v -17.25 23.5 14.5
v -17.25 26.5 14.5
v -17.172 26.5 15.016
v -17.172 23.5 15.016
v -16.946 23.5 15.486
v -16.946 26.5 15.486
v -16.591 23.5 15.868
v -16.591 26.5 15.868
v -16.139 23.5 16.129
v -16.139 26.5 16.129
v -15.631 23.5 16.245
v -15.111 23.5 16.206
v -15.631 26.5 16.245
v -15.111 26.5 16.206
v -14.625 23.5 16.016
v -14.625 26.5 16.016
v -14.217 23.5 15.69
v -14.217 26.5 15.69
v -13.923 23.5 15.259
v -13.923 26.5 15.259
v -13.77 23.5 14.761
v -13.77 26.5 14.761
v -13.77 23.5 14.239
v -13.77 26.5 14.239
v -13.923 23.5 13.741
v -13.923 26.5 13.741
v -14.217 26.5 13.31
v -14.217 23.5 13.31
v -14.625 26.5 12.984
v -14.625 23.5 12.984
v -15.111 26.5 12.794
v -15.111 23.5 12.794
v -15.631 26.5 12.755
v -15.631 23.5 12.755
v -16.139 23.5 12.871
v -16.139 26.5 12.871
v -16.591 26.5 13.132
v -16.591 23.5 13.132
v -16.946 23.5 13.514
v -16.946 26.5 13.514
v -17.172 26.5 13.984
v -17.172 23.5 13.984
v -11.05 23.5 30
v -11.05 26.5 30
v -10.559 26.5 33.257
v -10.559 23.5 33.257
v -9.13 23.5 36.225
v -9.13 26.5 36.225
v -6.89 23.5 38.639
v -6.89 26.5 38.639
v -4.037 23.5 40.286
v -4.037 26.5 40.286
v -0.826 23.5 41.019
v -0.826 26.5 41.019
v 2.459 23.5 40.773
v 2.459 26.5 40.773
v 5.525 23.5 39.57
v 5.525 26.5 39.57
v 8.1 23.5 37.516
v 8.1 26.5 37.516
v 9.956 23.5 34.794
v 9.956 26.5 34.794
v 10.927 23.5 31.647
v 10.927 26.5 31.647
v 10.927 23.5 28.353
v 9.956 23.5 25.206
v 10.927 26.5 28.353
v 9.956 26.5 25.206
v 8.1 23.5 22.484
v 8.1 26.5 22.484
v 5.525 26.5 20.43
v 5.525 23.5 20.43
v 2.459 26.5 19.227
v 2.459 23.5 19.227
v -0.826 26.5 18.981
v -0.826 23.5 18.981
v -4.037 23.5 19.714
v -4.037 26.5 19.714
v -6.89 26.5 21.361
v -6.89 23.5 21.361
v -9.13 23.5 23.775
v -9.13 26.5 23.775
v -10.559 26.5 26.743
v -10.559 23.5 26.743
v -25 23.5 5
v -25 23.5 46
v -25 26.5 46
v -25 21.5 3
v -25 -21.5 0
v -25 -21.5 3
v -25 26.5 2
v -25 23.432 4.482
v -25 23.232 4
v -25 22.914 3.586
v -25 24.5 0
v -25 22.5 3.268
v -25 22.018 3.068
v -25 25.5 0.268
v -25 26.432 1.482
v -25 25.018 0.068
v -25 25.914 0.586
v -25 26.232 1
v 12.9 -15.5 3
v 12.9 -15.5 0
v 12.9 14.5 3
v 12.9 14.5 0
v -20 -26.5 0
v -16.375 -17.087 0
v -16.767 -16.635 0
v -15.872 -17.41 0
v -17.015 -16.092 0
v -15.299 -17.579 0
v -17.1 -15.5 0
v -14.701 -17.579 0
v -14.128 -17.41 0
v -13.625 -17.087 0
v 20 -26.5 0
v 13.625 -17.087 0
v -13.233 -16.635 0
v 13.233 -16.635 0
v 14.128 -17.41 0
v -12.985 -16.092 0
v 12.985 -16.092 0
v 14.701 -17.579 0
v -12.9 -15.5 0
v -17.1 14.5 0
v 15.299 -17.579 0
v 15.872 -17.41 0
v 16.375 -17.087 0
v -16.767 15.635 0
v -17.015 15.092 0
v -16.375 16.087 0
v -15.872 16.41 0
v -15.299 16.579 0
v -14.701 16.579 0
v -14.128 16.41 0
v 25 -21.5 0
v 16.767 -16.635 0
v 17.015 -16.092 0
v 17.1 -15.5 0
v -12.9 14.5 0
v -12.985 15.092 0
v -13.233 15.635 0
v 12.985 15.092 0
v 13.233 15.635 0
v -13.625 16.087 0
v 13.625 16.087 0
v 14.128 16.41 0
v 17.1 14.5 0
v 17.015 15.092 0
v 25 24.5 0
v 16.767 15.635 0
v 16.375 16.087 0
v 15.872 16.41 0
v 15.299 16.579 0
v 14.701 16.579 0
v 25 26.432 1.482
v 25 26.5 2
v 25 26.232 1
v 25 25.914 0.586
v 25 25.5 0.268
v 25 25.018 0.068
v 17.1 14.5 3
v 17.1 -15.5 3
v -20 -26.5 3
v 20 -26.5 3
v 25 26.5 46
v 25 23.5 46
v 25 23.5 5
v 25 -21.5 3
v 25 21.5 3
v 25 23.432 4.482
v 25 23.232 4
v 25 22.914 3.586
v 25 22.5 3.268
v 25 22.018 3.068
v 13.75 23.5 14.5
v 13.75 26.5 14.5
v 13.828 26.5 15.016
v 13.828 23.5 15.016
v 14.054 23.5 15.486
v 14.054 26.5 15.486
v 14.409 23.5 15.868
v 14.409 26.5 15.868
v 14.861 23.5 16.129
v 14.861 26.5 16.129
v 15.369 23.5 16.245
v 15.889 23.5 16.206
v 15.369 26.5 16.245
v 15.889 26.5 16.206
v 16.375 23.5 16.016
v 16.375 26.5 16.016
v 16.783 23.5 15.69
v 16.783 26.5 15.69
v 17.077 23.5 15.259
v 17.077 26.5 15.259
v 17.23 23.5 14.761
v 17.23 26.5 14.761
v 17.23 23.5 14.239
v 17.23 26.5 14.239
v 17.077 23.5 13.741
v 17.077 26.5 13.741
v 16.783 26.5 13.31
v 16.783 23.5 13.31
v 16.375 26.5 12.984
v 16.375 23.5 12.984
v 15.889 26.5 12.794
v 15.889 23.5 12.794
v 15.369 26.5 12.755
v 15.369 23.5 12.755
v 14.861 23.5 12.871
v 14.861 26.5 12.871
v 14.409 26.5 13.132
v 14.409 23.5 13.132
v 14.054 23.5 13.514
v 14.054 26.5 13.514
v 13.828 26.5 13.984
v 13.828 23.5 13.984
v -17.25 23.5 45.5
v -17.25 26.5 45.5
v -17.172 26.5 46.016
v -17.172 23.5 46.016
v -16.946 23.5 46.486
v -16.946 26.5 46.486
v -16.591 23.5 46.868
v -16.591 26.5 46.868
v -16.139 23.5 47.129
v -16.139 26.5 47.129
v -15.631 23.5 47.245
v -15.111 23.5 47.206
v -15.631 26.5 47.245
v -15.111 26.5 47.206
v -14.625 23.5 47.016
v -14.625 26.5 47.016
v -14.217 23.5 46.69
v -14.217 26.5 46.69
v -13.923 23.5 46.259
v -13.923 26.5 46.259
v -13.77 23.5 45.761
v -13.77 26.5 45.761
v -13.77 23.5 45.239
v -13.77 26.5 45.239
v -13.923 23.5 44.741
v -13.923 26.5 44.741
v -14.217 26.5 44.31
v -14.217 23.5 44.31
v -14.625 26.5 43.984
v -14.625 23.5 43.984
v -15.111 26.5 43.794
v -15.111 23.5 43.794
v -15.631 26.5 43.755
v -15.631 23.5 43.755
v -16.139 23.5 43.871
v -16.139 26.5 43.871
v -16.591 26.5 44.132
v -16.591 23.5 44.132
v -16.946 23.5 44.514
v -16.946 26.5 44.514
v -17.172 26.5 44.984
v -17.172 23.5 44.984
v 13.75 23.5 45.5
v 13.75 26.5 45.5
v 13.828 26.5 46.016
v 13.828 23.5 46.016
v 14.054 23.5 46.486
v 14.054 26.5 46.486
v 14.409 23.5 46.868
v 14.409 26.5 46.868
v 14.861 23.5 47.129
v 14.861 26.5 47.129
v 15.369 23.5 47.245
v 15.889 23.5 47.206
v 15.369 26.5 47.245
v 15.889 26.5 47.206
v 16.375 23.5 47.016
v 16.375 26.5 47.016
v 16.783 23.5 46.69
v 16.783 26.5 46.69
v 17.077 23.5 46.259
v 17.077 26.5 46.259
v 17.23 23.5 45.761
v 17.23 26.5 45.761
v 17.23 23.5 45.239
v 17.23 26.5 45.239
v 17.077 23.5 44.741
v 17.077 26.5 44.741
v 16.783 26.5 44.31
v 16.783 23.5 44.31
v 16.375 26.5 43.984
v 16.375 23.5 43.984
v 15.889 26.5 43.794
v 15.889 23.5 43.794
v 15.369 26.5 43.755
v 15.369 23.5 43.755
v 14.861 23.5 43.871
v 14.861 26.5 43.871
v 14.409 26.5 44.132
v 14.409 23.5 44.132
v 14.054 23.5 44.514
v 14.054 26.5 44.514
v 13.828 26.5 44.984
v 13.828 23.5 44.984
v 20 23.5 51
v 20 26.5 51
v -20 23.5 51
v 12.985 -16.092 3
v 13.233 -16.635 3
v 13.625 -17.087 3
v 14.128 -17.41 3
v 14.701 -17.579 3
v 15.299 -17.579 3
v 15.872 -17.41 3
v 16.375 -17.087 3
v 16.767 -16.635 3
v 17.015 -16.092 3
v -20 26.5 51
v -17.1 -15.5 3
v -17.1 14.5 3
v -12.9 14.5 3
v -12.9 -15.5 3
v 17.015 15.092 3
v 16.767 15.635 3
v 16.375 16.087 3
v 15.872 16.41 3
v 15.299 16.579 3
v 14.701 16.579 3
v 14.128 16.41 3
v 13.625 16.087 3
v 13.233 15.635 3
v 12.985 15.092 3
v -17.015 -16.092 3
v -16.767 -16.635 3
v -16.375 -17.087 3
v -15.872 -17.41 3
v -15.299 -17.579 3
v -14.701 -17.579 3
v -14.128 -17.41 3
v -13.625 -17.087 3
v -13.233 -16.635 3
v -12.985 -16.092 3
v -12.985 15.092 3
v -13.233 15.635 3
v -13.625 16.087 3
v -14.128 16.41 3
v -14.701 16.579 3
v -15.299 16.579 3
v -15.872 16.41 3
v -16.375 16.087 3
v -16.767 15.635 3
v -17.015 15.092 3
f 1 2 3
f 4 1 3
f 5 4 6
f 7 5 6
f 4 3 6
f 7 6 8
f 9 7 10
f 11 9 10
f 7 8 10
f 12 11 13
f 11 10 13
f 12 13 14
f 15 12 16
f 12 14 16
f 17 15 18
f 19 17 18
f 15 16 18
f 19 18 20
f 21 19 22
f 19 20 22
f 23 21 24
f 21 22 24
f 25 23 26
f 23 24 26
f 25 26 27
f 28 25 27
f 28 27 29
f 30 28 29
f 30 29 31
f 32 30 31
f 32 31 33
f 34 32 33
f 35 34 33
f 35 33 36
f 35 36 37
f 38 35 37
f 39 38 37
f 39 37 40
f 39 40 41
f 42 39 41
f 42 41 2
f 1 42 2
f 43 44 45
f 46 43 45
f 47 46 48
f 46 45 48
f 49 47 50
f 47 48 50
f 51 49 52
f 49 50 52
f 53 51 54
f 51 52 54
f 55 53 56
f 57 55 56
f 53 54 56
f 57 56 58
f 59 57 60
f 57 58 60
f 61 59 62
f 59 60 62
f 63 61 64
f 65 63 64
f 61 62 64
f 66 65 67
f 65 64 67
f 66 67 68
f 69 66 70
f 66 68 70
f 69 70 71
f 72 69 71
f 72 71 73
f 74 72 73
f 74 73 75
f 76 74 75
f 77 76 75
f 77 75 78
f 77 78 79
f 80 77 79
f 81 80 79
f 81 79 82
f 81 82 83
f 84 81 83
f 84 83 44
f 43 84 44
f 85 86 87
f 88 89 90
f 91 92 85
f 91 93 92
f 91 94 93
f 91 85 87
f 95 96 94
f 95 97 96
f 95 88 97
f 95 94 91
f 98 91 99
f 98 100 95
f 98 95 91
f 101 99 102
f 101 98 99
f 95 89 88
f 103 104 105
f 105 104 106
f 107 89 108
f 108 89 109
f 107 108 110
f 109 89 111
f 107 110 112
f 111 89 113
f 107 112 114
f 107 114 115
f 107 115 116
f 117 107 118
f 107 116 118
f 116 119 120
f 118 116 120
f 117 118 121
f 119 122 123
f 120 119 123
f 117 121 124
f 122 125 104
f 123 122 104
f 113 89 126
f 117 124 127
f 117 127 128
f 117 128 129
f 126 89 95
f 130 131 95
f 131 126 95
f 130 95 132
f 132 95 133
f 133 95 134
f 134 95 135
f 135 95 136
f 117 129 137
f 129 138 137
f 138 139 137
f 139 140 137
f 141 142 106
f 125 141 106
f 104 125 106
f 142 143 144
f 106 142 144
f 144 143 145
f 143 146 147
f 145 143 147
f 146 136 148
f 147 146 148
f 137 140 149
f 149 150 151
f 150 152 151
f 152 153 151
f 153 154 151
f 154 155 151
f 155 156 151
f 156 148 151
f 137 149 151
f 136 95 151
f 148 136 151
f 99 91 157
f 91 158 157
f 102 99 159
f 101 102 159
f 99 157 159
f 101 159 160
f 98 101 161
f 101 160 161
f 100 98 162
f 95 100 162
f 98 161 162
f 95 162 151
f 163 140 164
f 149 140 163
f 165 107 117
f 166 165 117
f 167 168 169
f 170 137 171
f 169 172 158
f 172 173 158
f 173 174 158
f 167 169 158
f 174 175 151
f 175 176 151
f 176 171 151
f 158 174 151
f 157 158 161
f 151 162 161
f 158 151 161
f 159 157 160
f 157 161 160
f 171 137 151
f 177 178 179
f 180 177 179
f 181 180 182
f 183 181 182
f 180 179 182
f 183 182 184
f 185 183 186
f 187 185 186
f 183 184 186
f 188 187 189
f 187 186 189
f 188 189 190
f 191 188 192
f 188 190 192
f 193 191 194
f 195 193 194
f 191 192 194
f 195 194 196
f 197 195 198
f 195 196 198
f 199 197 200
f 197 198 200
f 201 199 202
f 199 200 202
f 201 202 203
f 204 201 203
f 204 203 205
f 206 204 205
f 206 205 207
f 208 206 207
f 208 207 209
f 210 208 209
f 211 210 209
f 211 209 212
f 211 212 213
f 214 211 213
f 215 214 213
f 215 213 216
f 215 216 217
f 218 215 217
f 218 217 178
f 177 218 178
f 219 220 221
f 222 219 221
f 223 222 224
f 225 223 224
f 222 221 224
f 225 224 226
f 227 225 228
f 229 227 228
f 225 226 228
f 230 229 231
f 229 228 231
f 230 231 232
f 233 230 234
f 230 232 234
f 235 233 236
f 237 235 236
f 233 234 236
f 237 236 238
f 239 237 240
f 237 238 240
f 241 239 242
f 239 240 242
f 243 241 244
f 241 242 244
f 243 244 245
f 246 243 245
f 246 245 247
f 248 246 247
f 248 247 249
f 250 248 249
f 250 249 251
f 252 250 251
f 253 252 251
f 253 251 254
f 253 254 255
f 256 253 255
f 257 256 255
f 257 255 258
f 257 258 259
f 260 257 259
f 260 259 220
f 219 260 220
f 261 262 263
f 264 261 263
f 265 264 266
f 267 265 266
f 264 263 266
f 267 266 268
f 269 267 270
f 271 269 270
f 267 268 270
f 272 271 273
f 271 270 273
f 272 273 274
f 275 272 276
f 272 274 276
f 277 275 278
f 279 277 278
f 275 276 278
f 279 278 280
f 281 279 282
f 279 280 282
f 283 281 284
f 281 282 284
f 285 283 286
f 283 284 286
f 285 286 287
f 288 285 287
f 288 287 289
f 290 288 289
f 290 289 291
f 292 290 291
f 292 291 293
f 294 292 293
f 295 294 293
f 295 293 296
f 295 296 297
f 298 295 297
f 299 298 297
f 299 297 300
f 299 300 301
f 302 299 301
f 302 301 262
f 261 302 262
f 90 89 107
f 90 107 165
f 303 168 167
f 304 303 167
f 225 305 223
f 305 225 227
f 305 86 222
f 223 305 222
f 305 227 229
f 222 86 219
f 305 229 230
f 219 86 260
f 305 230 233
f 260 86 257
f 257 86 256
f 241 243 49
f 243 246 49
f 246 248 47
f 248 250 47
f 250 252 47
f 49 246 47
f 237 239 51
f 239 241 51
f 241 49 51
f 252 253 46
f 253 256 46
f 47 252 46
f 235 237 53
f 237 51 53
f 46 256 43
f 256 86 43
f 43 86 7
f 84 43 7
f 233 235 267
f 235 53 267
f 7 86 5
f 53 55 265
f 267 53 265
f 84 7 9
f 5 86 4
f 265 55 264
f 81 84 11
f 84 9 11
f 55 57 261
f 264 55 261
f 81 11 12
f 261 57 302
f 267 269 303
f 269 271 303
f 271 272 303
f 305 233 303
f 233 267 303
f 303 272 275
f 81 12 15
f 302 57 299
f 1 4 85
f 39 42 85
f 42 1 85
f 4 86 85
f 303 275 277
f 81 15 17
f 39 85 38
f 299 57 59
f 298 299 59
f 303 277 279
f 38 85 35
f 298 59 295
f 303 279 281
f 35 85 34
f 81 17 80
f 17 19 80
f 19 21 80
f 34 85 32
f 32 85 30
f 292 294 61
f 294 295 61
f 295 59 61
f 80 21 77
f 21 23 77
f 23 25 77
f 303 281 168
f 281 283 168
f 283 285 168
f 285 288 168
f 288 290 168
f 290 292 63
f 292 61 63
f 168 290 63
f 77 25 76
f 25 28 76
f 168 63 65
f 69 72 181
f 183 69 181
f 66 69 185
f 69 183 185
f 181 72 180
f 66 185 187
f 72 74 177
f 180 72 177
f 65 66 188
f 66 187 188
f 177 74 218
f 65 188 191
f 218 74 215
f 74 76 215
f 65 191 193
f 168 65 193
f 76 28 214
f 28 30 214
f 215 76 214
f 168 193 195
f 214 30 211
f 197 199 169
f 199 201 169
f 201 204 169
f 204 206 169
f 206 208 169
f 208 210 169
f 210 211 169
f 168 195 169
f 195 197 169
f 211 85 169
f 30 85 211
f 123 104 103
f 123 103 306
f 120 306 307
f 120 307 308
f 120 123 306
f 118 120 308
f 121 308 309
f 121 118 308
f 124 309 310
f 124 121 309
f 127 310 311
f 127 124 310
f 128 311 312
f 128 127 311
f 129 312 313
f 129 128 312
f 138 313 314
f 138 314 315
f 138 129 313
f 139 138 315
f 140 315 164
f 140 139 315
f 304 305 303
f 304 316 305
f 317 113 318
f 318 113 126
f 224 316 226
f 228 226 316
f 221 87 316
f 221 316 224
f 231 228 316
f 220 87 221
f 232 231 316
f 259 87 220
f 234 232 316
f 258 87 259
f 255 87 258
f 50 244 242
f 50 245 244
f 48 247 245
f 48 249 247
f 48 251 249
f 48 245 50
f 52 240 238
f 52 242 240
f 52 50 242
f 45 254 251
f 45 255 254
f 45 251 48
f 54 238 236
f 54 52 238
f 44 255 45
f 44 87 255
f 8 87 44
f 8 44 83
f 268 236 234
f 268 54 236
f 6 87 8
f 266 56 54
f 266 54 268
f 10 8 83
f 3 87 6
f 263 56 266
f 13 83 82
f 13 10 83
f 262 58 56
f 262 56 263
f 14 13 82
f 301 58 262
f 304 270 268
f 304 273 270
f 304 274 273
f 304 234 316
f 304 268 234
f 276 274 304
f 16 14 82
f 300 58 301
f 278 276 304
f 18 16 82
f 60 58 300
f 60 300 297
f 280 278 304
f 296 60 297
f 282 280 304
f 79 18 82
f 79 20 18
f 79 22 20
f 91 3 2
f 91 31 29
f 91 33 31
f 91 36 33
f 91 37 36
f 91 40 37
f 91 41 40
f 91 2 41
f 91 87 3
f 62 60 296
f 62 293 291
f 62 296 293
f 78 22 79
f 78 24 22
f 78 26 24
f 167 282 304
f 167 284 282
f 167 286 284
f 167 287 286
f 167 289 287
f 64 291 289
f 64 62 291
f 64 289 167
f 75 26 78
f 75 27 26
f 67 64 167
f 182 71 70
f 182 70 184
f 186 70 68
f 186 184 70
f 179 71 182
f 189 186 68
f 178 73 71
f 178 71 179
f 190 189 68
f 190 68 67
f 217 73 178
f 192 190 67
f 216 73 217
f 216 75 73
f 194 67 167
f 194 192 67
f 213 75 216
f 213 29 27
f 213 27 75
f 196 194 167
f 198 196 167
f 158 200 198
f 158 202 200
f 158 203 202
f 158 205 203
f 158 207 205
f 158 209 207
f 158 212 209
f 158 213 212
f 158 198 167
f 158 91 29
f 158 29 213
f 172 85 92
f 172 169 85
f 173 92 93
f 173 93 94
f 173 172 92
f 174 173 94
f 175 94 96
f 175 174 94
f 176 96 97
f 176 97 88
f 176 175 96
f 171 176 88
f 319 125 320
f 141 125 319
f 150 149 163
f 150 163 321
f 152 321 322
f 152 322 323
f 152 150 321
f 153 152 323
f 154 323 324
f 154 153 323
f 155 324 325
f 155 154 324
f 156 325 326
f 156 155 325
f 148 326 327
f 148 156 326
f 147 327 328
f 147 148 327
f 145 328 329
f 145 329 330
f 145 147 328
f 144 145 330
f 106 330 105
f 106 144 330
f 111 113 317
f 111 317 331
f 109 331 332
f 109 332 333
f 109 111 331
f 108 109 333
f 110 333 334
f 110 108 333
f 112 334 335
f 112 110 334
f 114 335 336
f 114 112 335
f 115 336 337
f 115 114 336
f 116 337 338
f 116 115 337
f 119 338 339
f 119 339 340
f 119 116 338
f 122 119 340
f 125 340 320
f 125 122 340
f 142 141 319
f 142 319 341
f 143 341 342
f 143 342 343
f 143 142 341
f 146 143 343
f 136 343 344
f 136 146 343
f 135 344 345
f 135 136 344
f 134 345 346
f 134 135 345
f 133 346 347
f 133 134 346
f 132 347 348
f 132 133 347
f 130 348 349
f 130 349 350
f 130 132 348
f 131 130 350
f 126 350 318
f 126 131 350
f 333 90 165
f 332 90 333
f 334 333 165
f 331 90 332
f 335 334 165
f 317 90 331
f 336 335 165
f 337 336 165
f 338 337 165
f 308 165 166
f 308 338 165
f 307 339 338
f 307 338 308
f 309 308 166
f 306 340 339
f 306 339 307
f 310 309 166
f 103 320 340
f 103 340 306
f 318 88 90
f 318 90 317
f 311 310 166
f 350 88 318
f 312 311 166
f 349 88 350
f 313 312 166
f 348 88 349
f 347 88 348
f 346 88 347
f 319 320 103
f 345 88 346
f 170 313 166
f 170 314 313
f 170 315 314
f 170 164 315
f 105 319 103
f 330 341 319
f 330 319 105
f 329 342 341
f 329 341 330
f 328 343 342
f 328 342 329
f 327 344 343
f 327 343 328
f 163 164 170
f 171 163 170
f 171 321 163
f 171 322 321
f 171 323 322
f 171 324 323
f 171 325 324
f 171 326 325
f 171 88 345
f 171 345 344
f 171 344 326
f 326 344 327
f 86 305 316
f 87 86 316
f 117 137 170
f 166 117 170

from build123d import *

# Parameters (mm, degrees)
SKETCH_W      = 50
SKETCH_H      = 53
PAD_DEPTH     = 3
SKETCH001_W   = 50
SKETCH001_H   = 3
PAD001_DEPTH  = 48
SKETCH002_R   = 11.05
SKETCH002_R_2 = 1.75
POCKET_DEPTH  = 53.001
FILLET_R      = 2
CHAMFER_SIZE  = 5


with BuildPart() as part:
    # Sketch → Pad (new body)
    with BuildSketch(Plane.XY):
        Rectangle(SKETCH_W, SKETCH_H)
        with BuildLine():
            ThreePointArc((-17.1, -15.5), (-15, -17.6), (-12.9, -15.5))
            Line((-12.9, -15.5), (-12.9, 14.5))
            ThreePointArc((-12.9, 14.5), (-15, 16.6), (-17.1, 14.5))
            Line((-17.1, -15.5), (-17.1, 14.5))
        make_face(mode=Mode.SUBTRACT)
        with BuildLine():
            ThreePointArc((12.9, -15.5), (15, -17.6), (17.1, -15.5))
            Line((17.1, -15.5), (17.1, 14.5))
            ThreePointArc((17.1, 14.5), (15, 16.6), (12.9, 14.5))
            Line((12.9, -15.5), (12.9, 14.5))
        make_face(mode=Mode.SUBTRACT)
    extrude(amount=PAD_DEPTH)

    # Sketch001 → Pad001 (new body)
    with BuildSketch(Plane.XY.offset(3)):
        with Locations((0, 25)):
            Rectangle(SKETCH001_W, SKETCH001_H)
    extrude(amount=PAD001_DEPTH)

    # Sketch002 → Pocket (cut, through all)
    with BuildSketch(Plane(origin=(0, 26.5, 0), x_dir=(-1, 0, 0), z_dir=(0, 1, 0))):
        with Locations((0, 30)):
            Circle(SKETCH002_R)
        with Locations((-15.5, 45.5)):
            Circle(SKETCH002_R_2)
        with Locations((15.5, 45.5)):
            Circle(SKETCH002_R_2)
        with Locations((-15.5, 14.5)):
            Circle(SKETCH002_R_2)
        with Locations((15.5, 14.5)):
            Circle(SKETCH002_R_2)
    extrude(amount=-POCKET_DEPTH, mode=Mode.SUBTRACT)

    # Fillet
    fillet_edges = [part.edges().sort_by_distance(p)[0] for p in [
        (0, 26.5, 0),
        (0, 23.5, 3),
    ]]
    fillet(fillet_edges, radius=FILLET_R)

    # Chamfer
    chamfer_edges = [part.edges().sort_by_distance(p)[0] for p in [
        (25, 25, 51),
        (-25, 25, 51),
        (-25, -26.5, 1.5),
        (25, -26.5, 1.5),
    ]]
    chamfer(chamfer_edges, length=CHAMFER_SIZE)


solid = part.part
